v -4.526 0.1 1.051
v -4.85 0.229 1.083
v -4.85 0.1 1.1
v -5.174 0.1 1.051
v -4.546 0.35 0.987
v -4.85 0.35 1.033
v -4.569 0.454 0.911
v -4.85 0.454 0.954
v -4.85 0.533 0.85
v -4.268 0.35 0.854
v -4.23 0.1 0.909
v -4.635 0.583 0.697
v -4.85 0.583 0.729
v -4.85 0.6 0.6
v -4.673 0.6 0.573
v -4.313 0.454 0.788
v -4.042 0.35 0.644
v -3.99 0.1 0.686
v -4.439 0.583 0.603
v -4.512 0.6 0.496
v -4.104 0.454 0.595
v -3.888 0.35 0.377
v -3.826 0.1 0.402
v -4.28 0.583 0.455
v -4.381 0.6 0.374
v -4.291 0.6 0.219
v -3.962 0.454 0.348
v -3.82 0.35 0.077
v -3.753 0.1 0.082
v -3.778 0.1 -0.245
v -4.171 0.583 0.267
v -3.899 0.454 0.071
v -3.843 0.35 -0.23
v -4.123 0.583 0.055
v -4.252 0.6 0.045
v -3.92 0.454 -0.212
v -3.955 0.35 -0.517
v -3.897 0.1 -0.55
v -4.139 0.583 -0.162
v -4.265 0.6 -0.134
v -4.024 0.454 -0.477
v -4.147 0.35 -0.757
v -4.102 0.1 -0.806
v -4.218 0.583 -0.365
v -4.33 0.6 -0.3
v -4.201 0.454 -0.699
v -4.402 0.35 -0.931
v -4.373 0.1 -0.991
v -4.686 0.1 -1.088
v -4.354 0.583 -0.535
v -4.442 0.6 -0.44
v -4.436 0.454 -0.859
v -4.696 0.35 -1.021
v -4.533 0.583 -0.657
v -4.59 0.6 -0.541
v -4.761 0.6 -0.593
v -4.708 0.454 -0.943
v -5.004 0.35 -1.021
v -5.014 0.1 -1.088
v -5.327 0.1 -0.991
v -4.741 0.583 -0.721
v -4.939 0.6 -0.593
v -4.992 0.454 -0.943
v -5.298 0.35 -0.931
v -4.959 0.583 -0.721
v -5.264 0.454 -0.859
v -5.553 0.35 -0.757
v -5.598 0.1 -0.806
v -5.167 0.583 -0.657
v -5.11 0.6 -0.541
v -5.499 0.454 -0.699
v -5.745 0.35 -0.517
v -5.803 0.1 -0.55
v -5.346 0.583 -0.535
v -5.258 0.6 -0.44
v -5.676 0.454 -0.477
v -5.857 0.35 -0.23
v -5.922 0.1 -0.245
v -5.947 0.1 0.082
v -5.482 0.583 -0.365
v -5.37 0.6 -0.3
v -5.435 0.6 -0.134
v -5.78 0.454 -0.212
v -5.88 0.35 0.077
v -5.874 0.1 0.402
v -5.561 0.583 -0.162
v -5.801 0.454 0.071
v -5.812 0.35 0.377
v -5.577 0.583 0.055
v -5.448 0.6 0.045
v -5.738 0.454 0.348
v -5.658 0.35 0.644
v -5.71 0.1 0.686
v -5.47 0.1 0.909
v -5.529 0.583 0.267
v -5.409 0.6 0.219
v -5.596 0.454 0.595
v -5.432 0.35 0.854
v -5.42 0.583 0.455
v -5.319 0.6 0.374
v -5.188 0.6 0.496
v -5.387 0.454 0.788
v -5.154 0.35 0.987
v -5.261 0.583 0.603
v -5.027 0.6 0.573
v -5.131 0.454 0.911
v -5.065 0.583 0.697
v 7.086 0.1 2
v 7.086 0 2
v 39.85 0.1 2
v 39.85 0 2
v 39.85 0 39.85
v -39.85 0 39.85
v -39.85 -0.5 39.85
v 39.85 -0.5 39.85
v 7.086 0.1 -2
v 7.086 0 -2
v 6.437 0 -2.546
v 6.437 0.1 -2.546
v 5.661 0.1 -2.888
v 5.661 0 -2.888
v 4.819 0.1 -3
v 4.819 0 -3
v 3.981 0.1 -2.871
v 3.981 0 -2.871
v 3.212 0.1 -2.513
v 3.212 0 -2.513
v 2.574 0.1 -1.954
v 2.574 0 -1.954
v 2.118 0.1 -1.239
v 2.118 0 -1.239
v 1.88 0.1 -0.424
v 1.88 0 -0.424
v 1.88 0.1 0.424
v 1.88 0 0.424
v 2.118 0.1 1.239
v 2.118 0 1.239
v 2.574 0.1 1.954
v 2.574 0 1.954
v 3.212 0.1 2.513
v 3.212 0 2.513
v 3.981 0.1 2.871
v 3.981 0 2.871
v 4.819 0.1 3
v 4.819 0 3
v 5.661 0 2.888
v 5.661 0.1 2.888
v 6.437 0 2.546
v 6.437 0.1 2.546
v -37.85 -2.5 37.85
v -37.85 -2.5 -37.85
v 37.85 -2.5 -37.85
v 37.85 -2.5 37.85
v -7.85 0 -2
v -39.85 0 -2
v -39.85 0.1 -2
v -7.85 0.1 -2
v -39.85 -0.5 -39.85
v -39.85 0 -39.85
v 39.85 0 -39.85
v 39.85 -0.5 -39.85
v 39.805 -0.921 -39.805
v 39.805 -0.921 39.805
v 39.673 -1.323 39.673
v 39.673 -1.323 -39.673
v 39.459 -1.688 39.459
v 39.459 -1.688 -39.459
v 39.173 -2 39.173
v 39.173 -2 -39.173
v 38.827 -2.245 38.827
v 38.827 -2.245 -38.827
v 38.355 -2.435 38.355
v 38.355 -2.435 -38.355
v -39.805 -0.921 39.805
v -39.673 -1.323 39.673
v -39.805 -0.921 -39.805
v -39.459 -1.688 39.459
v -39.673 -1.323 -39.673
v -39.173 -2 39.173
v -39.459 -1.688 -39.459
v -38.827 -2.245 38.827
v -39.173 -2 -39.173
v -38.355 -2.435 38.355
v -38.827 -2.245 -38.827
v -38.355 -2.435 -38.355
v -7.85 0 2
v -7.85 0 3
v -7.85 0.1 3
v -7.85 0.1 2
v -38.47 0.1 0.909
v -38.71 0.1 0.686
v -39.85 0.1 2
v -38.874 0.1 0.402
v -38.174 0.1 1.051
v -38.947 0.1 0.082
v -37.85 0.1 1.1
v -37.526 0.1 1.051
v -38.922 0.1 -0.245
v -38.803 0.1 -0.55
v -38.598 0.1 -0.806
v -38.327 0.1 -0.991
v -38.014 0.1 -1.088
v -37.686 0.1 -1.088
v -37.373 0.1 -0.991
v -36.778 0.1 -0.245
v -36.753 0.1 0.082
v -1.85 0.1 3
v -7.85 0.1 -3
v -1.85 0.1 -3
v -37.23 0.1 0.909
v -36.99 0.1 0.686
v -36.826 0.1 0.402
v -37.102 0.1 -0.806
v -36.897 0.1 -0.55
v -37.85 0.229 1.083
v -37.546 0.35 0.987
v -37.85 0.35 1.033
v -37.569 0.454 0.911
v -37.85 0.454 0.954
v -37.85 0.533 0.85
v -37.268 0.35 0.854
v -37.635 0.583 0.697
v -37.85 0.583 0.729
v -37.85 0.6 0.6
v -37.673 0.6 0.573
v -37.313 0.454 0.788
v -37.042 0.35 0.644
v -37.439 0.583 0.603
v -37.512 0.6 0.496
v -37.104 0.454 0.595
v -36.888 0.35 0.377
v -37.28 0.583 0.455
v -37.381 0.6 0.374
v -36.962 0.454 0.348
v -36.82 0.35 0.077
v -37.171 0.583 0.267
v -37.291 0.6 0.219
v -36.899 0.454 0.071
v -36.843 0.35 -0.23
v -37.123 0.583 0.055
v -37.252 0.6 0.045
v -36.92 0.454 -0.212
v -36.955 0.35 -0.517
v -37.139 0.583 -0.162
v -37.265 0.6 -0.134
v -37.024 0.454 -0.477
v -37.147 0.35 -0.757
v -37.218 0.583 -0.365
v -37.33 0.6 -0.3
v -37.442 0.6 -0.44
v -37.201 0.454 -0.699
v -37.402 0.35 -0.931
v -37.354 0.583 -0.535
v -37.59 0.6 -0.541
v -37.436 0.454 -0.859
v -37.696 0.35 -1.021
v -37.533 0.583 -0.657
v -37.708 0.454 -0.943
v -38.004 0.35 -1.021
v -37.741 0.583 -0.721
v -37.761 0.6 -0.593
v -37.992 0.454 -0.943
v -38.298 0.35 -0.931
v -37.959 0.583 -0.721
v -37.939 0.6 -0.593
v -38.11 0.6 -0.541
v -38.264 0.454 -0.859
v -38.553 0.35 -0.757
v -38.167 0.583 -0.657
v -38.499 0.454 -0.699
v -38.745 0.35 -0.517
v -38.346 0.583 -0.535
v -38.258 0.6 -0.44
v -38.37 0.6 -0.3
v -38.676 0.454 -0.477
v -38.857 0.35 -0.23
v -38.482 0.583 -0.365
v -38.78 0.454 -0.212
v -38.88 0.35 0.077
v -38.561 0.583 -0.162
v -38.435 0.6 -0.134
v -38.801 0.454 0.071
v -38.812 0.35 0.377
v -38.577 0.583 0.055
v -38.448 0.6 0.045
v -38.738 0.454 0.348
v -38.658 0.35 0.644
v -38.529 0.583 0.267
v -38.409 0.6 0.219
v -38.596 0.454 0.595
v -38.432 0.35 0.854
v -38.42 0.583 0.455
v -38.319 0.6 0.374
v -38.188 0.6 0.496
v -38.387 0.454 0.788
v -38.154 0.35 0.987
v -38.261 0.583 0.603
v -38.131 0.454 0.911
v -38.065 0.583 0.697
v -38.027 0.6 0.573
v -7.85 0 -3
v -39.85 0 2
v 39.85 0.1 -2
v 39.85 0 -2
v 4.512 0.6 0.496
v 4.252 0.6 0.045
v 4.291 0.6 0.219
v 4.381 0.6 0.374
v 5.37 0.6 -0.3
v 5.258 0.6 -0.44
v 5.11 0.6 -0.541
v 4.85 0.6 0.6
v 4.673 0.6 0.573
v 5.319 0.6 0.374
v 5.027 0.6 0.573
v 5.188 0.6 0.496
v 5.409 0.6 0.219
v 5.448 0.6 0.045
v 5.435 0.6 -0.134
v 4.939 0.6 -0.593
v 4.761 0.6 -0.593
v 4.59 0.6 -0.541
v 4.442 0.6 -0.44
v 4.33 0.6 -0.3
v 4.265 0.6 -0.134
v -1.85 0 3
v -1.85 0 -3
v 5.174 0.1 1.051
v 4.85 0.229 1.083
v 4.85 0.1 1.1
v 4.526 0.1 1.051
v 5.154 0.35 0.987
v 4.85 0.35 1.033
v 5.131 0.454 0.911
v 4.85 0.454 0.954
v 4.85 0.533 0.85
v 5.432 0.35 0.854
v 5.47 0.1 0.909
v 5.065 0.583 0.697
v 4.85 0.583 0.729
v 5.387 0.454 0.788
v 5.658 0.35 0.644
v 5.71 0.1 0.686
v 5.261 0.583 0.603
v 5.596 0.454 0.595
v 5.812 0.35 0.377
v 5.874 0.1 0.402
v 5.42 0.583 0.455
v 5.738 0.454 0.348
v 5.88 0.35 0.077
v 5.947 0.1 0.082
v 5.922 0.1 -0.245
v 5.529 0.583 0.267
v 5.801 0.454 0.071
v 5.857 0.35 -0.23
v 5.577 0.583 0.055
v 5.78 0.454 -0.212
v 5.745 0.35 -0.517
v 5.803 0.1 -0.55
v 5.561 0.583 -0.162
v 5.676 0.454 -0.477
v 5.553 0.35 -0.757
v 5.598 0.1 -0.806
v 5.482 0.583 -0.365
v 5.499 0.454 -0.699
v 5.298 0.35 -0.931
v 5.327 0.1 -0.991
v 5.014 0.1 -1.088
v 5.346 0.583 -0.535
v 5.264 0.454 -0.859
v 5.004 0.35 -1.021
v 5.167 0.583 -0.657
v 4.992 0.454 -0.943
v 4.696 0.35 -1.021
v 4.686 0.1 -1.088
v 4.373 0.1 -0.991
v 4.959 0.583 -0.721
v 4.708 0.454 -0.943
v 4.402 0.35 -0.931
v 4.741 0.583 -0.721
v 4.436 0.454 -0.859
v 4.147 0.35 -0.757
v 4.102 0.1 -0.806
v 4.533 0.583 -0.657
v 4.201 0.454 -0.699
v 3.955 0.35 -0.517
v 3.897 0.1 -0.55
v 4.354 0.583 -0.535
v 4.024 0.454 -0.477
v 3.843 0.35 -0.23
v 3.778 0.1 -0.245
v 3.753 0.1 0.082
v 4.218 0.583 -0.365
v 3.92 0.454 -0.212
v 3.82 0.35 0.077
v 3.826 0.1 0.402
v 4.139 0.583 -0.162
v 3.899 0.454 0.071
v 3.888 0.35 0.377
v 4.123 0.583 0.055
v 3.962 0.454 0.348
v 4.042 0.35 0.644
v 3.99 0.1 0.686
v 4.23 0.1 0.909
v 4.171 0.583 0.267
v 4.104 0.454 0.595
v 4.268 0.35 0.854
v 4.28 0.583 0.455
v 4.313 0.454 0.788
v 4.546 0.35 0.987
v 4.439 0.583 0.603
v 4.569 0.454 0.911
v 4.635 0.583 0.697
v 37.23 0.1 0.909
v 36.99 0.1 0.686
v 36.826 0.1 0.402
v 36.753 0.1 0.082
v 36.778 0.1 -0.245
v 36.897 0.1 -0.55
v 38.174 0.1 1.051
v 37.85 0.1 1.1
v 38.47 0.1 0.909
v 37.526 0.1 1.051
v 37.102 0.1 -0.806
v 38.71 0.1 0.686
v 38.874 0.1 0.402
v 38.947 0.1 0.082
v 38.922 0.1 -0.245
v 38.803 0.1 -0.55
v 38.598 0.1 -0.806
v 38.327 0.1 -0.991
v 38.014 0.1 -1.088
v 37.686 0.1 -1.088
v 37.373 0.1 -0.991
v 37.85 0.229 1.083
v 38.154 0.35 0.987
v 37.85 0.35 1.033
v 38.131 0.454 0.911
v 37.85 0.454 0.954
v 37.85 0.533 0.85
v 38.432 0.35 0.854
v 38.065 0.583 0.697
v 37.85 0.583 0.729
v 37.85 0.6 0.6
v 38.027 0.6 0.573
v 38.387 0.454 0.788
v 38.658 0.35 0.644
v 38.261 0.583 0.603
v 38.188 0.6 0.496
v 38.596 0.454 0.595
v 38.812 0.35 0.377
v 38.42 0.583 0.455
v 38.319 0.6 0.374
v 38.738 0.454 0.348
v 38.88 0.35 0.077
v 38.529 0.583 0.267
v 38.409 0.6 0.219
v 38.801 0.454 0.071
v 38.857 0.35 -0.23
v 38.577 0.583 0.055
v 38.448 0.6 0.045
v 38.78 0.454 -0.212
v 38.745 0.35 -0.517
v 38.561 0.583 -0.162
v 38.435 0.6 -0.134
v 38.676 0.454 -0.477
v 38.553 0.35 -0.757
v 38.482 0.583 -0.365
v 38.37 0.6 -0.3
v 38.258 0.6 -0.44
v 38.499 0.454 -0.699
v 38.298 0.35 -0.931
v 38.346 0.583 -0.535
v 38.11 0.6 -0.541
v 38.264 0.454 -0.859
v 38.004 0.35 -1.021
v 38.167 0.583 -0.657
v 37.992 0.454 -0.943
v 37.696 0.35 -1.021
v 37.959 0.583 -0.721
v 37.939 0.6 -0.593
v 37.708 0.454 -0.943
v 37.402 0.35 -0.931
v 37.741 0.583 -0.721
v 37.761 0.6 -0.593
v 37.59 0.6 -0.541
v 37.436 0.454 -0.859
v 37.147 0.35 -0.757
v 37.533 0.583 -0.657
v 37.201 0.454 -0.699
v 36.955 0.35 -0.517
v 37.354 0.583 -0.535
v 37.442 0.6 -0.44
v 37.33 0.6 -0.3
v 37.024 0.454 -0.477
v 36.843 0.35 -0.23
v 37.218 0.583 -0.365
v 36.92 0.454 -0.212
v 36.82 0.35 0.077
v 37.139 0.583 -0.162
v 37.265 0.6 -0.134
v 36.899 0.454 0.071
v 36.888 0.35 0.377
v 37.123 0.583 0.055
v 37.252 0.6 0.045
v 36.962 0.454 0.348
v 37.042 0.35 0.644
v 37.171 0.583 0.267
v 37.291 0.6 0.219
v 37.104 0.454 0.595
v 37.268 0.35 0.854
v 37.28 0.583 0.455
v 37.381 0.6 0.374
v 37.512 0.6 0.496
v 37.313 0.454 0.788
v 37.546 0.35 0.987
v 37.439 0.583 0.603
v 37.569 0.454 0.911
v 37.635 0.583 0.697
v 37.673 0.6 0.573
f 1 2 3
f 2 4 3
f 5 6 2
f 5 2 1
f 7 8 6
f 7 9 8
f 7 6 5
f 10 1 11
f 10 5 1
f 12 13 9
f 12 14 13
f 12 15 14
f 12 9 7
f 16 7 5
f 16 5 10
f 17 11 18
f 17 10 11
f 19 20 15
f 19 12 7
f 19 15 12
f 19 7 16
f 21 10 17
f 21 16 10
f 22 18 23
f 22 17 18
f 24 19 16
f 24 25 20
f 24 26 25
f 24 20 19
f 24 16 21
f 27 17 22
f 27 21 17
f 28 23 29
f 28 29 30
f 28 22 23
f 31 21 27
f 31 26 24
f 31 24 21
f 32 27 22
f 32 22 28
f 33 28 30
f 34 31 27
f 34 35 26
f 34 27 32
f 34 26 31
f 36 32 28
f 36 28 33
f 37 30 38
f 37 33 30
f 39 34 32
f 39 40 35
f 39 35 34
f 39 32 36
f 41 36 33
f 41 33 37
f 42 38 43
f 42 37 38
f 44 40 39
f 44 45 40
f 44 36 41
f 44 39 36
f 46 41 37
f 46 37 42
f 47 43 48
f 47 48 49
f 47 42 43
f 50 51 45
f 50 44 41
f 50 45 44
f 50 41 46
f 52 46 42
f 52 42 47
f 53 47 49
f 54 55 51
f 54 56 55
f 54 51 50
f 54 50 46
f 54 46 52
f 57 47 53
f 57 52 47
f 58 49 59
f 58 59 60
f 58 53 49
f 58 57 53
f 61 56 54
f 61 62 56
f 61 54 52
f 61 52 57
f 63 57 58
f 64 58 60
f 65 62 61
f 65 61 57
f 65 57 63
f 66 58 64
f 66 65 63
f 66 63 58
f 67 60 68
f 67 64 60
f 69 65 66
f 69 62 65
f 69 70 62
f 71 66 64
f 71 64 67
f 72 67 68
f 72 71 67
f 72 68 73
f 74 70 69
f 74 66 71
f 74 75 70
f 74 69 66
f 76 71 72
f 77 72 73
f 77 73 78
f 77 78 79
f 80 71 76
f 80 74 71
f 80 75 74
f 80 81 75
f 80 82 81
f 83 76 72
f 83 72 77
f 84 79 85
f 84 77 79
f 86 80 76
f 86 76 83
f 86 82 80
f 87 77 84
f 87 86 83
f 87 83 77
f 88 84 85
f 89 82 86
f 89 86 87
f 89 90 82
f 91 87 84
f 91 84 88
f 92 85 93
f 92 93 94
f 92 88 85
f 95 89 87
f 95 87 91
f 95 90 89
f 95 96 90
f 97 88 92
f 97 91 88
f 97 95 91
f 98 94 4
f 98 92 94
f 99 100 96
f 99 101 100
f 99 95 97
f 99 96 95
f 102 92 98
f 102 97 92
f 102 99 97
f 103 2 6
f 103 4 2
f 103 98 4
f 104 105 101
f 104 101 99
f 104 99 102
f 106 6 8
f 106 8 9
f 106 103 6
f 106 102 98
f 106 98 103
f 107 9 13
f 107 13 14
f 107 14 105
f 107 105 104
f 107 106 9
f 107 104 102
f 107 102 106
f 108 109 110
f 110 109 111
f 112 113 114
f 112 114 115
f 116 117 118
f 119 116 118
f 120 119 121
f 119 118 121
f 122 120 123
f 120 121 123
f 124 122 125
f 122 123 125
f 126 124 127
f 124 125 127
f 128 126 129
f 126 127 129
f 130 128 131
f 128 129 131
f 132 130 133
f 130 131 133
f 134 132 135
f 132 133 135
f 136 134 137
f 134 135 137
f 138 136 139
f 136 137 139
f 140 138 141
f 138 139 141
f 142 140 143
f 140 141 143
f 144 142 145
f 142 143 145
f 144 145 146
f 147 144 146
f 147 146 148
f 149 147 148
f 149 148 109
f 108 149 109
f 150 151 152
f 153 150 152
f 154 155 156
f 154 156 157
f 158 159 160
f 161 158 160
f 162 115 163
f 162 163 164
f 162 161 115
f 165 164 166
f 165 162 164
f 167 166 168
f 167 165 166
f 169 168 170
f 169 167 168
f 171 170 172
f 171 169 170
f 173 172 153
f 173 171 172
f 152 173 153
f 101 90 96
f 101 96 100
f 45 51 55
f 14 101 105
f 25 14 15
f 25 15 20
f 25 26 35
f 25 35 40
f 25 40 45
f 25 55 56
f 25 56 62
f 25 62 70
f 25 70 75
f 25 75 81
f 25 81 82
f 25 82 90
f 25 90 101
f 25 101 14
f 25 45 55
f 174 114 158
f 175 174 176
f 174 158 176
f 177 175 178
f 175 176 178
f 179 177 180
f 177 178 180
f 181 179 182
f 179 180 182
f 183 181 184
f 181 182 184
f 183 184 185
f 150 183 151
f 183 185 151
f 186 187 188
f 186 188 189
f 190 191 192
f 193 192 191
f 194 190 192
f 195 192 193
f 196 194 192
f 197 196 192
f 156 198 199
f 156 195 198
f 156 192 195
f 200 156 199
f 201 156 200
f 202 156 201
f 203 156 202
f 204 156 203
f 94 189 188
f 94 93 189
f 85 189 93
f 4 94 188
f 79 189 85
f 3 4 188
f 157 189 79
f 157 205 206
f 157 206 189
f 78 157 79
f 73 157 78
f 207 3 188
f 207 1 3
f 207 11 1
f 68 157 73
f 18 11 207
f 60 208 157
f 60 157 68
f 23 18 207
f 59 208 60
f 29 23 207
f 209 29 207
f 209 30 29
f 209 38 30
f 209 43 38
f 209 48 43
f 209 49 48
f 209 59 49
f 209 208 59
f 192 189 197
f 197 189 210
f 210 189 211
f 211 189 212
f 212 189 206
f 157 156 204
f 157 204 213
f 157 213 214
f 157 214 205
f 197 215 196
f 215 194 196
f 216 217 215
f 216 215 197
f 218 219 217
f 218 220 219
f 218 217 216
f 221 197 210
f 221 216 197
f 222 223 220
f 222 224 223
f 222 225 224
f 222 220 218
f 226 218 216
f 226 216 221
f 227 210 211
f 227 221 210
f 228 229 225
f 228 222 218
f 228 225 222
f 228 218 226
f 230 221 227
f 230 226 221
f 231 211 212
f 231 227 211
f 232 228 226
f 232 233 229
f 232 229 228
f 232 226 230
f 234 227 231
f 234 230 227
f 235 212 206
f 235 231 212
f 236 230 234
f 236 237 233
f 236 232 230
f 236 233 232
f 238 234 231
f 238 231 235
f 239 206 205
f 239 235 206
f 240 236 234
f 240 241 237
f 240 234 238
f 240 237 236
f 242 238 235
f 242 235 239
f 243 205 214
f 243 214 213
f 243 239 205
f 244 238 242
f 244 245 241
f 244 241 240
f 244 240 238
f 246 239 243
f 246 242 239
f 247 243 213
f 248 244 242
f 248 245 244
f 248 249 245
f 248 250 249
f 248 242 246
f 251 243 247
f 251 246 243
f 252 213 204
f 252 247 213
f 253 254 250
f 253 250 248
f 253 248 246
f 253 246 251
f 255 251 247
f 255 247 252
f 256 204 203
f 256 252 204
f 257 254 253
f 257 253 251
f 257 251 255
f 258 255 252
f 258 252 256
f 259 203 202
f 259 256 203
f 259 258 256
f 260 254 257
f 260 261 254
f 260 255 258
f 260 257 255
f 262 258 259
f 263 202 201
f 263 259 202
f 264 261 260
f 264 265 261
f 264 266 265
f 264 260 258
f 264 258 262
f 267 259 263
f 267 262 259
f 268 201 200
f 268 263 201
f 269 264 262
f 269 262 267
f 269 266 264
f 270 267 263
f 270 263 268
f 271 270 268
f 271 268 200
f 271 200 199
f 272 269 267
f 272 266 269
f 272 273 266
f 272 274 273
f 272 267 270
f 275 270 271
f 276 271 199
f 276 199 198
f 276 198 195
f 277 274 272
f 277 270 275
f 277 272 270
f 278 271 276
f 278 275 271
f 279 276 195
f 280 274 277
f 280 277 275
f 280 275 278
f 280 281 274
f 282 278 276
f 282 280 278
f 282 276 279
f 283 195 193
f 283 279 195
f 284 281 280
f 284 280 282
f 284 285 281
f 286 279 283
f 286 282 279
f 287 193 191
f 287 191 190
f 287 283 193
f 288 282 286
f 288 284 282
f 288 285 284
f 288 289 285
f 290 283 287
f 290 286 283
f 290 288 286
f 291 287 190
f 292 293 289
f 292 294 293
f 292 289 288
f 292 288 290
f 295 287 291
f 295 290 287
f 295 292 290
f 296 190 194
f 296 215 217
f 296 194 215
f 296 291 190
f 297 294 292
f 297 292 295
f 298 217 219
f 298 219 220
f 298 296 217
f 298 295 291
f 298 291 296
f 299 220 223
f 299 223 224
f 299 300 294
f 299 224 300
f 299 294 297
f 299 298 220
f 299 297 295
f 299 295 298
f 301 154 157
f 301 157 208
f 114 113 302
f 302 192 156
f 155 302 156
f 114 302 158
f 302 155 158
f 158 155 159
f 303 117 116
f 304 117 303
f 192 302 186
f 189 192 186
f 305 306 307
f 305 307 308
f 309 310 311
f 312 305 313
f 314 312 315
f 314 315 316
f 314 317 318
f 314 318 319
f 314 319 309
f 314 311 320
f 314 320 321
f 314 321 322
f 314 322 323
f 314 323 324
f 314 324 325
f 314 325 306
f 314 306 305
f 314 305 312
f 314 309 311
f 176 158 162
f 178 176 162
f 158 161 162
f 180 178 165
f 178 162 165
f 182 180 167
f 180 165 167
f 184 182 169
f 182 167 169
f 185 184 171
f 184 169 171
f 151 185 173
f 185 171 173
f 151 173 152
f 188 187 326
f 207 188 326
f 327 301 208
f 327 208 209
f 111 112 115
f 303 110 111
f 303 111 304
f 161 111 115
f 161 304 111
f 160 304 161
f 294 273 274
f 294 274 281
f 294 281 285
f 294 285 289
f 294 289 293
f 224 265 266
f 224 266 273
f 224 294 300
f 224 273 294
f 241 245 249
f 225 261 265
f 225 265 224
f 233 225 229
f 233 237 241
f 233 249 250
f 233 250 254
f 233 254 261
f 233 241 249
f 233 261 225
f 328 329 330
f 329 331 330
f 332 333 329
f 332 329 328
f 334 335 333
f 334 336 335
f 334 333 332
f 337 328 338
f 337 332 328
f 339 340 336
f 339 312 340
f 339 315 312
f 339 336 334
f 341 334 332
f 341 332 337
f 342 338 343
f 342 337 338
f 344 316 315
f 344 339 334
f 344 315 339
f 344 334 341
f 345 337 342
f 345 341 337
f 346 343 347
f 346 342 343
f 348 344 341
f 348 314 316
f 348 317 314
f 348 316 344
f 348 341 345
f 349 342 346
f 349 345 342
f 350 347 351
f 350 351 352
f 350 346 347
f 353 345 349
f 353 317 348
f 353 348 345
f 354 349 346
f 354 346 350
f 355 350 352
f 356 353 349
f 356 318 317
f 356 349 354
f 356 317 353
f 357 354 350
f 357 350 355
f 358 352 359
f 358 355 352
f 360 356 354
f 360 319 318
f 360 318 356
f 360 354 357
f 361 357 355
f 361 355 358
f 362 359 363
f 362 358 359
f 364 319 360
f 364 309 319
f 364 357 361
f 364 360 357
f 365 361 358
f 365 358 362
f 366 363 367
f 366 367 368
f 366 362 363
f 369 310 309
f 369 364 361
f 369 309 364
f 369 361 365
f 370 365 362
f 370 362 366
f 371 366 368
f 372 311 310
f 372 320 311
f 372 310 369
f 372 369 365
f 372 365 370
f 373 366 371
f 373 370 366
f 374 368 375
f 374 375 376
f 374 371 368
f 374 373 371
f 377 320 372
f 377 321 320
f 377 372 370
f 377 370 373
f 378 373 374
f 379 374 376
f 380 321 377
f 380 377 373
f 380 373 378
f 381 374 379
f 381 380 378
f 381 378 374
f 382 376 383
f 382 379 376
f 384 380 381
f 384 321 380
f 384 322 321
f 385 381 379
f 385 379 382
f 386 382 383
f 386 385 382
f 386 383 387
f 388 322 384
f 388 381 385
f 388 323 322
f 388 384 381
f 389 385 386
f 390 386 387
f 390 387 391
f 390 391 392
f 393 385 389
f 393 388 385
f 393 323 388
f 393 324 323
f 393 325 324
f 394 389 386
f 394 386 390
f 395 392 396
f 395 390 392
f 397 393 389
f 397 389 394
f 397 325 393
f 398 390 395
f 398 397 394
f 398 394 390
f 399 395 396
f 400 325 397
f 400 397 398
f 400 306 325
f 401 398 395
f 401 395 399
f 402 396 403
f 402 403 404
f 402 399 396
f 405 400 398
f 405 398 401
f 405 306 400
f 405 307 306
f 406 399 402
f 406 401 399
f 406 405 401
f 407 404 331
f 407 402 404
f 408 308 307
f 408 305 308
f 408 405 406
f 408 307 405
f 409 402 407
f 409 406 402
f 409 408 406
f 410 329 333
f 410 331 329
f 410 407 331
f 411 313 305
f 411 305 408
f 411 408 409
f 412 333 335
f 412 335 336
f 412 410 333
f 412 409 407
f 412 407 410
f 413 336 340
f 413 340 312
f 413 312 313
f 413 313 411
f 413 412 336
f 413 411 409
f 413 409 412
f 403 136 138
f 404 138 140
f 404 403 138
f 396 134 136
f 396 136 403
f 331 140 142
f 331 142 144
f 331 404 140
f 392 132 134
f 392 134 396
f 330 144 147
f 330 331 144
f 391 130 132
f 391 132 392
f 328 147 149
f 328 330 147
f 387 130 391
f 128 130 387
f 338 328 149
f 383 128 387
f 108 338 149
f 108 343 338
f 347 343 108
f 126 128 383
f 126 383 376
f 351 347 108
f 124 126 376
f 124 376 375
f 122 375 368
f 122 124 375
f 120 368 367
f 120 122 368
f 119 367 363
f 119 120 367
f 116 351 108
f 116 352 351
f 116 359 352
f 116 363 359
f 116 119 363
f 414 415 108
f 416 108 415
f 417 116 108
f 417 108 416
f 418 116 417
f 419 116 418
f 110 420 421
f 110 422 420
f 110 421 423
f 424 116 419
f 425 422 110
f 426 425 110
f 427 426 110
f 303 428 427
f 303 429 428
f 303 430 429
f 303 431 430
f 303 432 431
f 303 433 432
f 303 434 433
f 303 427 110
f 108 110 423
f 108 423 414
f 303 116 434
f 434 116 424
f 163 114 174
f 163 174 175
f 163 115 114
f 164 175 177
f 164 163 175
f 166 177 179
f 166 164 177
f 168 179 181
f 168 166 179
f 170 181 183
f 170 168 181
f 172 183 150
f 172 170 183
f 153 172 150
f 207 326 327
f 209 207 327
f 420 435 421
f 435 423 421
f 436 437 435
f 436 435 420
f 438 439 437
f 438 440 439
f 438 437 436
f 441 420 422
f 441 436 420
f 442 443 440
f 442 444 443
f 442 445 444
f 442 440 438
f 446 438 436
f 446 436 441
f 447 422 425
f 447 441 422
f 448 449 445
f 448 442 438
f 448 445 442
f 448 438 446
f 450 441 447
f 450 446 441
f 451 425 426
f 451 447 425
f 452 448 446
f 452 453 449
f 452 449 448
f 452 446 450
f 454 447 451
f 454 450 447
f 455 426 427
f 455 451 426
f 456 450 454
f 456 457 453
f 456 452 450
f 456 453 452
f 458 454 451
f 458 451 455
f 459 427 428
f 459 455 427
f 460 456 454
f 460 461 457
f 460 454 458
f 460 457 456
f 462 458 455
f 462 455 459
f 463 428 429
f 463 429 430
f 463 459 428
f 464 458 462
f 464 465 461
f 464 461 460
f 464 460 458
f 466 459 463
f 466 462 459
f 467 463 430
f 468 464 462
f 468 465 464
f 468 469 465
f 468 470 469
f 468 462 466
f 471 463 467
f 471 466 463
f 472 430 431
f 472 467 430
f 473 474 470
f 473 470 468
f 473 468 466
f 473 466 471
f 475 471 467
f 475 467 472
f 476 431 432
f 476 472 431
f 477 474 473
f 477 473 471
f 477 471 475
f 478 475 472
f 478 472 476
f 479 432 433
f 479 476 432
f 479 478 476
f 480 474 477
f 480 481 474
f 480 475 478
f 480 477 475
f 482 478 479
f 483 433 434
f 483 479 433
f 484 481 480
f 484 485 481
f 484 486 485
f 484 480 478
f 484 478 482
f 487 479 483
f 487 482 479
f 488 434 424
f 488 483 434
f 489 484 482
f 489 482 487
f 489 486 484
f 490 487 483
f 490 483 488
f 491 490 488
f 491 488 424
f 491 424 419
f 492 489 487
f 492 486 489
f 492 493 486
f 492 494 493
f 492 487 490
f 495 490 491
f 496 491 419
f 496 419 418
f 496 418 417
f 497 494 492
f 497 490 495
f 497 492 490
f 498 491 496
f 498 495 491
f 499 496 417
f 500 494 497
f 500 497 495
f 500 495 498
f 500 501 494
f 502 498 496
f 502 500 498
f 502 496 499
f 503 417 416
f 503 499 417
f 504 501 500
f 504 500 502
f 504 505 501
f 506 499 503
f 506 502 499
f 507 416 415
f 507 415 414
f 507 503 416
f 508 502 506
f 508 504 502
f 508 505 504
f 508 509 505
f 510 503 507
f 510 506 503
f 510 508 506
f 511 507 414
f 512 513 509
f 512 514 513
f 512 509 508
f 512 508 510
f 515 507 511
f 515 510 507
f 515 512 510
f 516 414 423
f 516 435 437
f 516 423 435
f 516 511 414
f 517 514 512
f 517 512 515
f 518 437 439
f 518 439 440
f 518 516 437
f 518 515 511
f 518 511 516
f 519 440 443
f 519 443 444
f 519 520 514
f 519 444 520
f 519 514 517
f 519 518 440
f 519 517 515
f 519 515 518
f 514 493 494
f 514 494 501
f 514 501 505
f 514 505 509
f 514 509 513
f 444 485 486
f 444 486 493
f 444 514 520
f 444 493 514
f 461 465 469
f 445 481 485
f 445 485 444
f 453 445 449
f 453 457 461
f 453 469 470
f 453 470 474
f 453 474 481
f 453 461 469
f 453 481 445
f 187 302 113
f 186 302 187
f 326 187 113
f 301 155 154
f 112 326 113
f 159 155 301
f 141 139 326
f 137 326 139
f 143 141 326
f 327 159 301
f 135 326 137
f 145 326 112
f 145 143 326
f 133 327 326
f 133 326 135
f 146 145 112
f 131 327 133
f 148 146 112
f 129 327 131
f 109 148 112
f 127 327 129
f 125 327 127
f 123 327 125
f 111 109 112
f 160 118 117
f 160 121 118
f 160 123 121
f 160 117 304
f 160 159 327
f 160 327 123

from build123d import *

# Parameters (mm, degrees)
SKETCH_1_W      = 79.7
SKETCH_1_H      = 79.7
EXTRUDE_1_DEPTH = 2.5
FILLET_1_R      = 2
SKETCH_2_W      = 37
SKETCH_2_H      = 4
EXTRUDE_2_DEPTH = 0.1
SKETCH_3_R      = 3
SKETCH_3_W      = 6
SKETCH_3_H      = 6
EXTRUDE_3_DEPTH = 0.1
SKETCH_4_R      = 1.1
EXTRUDE_4_DEPTH = 0.5
FILLET_2_R      = 0.5


with BuildPart() as part:
    # Эскиз1 → Бобышка-Вытянуть1 (new body)
    with BuildSketch(Plane(origin=(0, 0, 0), x_dir=(1, 0, 0), z_dir=(0, 1, 0))):
        Rectangle(SKETCH_1_W, SKETCH_1_H)
    extrude(amount=-EXTRUDE_1_DEPTH)

    # Скругление1
    fillet_1_edges = [part.edges().sort_by_distance(p)[0] for p in [
        (39.85, -2.5, 0),
        (0, -2.5, -39.85),
        (-39.85, -2.5, 0),
        (0, -2.5, 39.85),
    ]]
    fillet(fillet_1_edges, radius=FILLET_1_R)

    # Эскиз2 → Бобышка-Вытянуть2 (add)
    with BuildSketch(Plane(origin=(0, 0, 0), x_dir=(1, 0, 0), z_dir=(0, 1, 0))):
        with Locations((21.35, 0)):
            Rectangle(SKETCH_2_W, SKETCH_2_H)
        with Locations((-21.35, 0)):
            Rectangle(SKETCH_2_W, SKETCH_2_H)
    extrude(amount=EXTRUDE_2_DEPTH)

    # Эскиз3 → Бобышка-Вытянуть3 (add)
    with BuildSketch(Plane(origin=(0, 0, 0), x_dir=(1, 0, 0), z_dir=(0, 1, 0))):
        with Locations((4.85, 0)):
            Circle(SKETCH_3_R)
        with Locations((-4.85, 0)):
            Rectangle(SKETCH_3_W, SKETCH_3_H)
    extrude(amount=EXTRUDE_3_DEPTH)

    # Эскиз4 → Бобышка-Вытянуть4 (add)
    with BuildSketch(Plane(origin=(0, 0.1, 0), x_dir=(1, 0, 0), z_dir=(0, 1, 0))):
        with Locations(Location((4.85, 0, 0), (0, 0, 270))):
            Circle(SKETCH_4_R)
        with Locations(Location((-4.85, 0, 0), (0, 0, 270))):
            Circle(SKETCH_4_R)
        with Locations(Location((37.85, 0, 0), (0, 0, 270))):
            Circle(SKETCH_4_R)
        with Locations(Location((-37.85, 0, 0), (0, 0, 270))):
            Circle(SKETCH_4_R)
    extrude(amount=EXTRUDE_4_DEPTH)

    # Скругление2
    fillet_2_edges = [part.edges().sort_by_distance(p)[0] for p in [
        (4.85, 0.6, -1.1),
        (-4.85, 0.6, -1.1),
        (37.85, 0.6, -1.1),
        (-37.85, 0.6, -1.1),
    ]]
    fillet(fillet_2_edges, radius=FILLET_2_R - 0.0001)  # a hair under: the kernel refuses the full size


solid = part.part
